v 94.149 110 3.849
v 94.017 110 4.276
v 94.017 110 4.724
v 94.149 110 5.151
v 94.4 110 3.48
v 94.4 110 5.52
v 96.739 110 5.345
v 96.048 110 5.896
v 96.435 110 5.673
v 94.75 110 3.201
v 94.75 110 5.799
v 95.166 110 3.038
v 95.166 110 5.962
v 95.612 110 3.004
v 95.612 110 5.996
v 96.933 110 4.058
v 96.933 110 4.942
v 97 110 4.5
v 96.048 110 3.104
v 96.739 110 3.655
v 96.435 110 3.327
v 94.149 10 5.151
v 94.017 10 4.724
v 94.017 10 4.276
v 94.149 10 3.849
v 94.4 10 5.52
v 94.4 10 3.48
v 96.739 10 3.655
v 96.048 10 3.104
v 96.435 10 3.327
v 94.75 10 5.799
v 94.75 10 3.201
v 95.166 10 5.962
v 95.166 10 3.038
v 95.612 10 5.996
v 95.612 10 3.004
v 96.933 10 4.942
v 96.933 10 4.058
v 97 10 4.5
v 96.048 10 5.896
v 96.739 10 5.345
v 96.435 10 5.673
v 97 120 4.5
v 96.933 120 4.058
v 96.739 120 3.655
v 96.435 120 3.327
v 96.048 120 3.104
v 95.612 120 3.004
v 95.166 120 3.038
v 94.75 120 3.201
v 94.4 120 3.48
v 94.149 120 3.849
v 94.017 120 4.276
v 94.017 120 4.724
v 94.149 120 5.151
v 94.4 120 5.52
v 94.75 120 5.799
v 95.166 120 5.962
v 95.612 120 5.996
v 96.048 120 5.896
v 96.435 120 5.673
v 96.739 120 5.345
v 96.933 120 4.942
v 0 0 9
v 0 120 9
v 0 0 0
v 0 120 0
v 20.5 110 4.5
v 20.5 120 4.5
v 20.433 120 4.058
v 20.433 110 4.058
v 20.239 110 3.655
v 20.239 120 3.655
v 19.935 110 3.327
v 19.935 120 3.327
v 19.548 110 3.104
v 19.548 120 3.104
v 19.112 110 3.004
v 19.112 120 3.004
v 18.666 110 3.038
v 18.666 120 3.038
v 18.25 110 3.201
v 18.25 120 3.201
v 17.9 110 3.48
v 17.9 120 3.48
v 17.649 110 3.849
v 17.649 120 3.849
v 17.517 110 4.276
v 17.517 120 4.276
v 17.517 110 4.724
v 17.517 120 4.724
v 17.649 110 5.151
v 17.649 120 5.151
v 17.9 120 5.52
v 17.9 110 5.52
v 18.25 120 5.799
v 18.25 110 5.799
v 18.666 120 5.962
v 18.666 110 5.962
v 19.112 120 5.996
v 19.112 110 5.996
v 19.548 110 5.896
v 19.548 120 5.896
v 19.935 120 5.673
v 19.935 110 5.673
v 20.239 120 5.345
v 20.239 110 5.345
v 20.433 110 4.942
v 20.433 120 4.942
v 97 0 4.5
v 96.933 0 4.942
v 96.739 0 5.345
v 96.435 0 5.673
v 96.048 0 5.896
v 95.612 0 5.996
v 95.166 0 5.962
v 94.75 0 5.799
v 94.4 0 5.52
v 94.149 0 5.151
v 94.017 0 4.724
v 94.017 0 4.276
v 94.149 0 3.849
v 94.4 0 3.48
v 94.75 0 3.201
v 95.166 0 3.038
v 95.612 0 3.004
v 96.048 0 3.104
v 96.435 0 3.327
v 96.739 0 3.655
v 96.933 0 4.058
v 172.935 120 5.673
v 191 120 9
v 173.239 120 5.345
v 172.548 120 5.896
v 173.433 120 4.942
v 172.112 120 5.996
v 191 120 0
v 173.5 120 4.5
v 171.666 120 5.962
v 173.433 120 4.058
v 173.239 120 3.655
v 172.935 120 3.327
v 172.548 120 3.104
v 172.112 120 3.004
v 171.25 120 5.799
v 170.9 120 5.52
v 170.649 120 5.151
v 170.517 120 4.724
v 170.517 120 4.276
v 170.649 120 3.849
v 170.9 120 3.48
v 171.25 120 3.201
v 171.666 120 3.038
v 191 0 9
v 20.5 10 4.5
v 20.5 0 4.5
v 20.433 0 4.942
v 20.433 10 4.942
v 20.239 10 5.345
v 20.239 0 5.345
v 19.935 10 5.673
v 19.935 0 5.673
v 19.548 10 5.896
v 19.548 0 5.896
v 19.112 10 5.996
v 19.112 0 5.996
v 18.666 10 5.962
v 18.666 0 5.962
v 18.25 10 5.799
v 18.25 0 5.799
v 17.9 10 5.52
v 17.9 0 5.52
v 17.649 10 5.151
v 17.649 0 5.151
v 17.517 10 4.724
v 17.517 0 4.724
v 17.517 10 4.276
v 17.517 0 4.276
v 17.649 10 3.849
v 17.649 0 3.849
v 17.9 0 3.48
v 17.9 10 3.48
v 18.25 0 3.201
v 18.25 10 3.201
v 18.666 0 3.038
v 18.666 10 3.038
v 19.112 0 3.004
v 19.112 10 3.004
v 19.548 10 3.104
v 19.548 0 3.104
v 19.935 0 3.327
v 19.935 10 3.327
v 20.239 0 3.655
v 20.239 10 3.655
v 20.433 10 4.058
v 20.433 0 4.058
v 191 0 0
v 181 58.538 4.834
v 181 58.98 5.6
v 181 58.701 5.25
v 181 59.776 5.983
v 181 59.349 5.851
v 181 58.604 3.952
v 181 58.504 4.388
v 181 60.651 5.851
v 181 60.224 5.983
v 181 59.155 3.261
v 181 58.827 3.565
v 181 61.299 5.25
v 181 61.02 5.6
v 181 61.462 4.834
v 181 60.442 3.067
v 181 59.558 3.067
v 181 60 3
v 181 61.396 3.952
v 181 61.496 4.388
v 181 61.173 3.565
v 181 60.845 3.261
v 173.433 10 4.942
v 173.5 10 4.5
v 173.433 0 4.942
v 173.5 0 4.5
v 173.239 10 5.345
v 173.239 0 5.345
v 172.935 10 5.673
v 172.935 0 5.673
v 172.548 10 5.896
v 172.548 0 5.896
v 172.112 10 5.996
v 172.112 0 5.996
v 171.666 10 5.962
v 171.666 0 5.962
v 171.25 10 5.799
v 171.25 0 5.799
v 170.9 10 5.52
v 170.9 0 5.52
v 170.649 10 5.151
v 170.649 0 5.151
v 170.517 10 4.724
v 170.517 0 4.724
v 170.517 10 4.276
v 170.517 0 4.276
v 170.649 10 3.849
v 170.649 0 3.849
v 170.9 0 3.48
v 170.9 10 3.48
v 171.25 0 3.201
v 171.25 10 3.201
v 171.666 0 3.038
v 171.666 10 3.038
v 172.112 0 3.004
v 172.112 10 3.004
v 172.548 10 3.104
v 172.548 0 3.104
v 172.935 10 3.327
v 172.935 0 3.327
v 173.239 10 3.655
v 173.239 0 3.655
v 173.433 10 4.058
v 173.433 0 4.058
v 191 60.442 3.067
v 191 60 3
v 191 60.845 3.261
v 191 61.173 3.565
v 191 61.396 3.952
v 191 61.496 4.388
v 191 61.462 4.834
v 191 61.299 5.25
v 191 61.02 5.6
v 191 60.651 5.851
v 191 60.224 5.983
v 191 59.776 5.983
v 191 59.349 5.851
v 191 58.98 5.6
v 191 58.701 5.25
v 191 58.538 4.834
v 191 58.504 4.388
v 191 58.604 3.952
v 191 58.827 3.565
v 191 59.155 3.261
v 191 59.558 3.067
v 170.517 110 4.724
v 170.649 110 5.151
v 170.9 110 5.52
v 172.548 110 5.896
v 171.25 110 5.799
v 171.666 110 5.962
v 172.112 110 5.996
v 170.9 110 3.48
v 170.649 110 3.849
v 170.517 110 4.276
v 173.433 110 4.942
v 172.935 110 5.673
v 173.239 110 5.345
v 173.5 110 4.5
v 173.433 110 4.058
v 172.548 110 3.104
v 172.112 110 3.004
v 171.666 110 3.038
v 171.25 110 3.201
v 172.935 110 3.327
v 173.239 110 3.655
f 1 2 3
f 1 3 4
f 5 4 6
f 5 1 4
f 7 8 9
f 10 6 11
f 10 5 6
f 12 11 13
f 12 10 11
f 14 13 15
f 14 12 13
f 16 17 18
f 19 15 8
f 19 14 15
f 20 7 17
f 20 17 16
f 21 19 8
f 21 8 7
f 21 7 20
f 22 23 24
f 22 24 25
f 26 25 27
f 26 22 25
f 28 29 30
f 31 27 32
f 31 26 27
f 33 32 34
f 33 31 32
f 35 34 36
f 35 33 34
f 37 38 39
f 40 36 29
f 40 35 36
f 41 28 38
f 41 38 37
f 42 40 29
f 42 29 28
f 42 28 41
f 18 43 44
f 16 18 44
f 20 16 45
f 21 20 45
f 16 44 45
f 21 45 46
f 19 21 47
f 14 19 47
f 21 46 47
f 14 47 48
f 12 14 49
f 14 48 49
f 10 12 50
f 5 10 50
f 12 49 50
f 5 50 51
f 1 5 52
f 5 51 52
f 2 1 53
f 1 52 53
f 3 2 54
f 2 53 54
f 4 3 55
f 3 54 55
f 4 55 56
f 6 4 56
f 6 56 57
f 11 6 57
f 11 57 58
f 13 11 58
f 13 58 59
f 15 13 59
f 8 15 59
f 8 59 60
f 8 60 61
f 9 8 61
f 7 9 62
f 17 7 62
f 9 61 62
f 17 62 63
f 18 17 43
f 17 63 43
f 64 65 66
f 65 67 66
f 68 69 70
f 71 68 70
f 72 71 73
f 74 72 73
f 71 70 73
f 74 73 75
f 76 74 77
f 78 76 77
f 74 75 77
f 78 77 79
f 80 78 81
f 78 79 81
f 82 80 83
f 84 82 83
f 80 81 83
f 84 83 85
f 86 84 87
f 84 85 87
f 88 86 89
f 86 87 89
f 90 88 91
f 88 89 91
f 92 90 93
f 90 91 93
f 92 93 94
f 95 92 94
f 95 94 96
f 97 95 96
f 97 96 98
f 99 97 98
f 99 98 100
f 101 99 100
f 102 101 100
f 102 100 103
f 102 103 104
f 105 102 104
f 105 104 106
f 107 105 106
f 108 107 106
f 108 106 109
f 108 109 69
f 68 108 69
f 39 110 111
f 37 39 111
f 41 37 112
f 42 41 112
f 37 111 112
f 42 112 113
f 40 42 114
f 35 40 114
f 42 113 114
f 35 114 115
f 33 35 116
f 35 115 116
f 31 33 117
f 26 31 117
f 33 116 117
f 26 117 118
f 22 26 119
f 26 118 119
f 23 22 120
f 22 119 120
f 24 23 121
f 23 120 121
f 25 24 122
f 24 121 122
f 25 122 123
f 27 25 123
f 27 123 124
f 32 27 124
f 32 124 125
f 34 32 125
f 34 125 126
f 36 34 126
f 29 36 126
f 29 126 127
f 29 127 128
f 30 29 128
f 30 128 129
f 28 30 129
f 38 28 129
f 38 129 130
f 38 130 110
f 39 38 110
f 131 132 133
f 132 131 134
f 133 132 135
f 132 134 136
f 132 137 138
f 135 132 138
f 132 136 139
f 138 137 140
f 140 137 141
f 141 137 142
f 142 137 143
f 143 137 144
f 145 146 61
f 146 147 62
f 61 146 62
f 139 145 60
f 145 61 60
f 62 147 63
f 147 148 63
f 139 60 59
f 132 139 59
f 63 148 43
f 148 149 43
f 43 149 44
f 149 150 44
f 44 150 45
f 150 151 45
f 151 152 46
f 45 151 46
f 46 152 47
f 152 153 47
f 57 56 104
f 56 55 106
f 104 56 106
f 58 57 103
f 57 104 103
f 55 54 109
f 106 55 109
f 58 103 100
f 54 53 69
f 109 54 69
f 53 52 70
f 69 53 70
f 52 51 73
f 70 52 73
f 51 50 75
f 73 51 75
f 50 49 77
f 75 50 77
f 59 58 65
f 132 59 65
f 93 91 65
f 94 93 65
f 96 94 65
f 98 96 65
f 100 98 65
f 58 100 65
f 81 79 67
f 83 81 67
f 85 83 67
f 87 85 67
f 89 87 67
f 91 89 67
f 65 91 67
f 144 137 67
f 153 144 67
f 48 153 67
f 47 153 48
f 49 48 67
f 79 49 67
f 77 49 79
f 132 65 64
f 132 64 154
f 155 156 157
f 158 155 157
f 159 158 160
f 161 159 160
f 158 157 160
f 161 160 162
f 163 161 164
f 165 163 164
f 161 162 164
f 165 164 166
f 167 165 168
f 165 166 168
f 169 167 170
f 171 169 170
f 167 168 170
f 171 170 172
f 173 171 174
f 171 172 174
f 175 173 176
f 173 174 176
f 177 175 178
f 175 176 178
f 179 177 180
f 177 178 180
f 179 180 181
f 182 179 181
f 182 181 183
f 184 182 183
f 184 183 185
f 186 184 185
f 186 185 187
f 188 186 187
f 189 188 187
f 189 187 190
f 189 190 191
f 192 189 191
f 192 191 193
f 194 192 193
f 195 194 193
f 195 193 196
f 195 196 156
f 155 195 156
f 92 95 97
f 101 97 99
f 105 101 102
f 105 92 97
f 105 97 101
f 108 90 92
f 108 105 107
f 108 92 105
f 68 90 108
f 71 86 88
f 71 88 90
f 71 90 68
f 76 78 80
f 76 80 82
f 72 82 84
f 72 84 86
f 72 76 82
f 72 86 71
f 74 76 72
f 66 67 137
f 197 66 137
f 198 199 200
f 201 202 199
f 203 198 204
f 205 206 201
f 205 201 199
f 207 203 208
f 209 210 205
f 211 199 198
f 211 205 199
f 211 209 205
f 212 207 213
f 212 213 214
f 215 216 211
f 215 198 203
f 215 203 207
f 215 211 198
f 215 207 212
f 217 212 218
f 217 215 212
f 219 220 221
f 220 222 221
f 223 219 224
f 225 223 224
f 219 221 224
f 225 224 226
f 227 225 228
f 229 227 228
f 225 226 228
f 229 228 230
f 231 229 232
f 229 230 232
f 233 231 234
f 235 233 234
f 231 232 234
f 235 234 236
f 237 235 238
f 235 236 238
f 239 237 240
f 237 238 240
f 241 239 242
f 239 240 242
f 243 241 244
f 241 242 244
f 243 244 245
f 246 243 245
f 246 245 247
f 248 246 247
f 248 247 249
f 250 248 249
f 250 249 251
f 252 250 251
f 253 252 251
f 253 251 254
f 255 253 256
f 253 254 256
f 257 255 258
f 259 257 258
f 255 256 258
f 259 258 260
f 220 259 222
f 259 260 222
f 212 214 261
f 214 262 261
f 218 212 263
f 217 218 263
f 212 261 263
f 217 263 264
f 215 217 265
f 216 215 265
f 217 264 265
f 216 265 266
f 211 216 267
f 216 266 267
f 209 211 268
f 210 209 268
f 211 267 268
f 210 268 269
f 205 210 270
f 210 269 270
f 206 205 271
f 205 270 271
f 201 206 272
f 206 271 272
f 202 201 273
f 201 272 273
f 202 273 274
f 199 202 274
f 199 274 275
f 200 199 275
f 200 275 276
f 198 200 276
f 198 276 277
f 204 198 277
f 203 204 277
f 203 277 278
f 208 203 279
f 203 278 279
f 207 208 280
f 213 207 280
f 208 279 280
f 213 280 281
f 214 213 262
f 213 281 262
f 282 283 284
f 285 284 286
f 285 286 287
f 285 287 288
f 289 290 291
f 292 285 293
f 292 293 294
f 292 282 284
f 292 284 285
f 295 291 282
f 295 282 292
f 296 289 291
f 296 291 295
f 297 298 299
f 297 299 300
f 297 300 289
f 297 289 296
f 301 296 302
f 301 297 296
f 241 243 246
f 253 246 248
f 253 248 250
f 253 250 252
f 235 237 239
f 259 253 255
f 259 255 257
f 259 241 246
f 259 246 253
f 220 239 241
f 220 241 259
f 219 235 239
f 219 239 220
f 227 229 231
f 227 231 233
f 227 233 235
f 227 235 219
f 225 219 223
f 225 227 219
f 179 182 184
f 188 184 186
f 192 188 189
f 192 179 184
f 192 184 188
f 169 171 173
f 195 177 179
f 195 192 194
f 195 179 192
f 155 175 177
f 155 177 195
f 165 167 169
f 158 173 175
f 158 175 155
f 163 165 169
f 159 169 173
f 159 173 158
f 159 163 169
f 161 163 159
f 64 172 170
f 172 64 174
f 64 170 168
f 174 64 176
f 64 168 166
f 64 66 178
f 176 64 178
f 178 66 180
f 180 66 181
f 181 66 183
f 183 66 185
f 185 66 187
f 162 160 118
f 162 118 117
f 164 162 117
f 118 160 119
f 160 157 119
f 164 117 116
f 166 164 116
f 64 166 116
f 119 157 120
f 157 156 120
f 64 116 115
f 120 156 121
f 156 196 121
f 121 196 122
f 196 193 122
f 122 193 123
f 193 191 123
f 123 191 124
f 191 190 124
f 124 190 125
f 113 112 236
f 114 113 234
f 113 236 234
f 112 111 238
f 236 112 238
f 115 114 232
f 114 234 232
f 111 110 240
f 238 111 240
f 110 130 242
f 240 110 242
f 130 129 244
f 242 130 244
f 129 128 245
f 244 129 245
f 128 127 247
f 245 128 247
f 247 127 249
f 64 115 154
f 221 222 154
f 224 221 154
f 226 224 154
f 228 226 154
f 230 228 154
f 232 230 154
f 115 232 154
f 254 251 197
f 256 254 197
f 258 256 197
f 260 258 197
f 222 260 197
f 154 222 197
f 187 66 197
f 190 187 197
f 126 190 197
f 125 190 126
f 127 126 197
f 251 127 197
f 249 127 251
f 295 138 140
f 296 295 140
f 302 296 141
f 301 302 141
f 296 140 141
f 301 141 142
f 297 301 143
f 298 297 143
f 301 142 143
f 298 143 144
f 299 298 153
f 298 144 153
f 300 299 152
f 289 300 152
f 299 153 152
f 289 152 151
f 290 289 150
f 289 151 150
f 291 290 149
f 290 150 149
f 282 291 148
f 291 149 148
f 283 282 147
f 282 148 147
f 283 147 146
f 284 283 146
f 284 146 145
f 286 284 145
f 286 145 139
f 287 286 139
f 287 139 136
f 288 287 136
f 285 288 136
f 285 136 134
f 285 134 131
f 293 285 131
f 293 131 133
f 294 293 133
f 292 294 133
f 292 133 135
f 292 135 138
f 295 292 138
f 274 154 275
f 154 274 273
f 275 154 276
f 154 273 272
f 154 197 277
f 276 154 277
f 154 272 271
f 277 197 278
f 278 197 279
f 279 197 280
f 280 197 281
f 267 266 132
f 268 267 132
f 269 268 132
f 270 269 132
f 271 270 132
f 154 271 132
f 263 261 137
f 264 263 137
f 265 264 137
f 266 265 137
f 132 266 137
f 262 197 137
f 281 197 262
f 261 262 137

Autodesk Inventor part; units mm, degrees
ref_plane "YZ Plane" through (0, 0, 0) normal (1, 0, 0) x (0, 1, 0)
ref_plane "XZ Plane" through (0, 0, 0) normal (0, 1, 0) x (-1, 0, 0)
ref_plane "XY Plane" through (0, 0, 0) normal (0, 0, 1) x (1, 0, 0)
sketch "Sketch1" plane through (0, 0, 0) normal (0, 0, 1) x (1, 0, 0)
  line L0 (0, 0) -> (191, 0)
  line L1 (191, 0) -> (191, 120)
  line L2 (191, 120) -> (0, 120)
  line L3 (0, 120) -> (0, 0)
  dimension "d0" = 191
  dimension "d1" = 120
extrude "Extrusion1" add sketch "Sketch1" along normal blind 9
sketch "Sketch2" plane through (0, 120, 0) normal (0, 1, 0) x (1, 0, 0)
  line L0 (191, 0) -> (0, 0) projected
  line L1 (0, 0) -> (0, -9) projected
  line L2 (191, -9) -> (0, -9) projected
  line L3 (191, 0) -> (191, -9) projected
  circle A0 centre (19, -4.5) radius 1.5
  circle A1 centre (95.5, -4.5) radius 1.5
  circle A2 centre (172, -4.5) radius 1.5
  point P0 (0, 0)
  dimension "d4" = 3
  dimension "d5" = 3
  dimension "d6" = 3
  dimension "d18" = 76.5
extrude "Extrusion2" cut sketch "Sketch2" against normal blind 10 contours A0 | A1 | A2
sketch "Sketch3" plane through (0, 0, 0) normal (0, -1, 0) x (1, 0, 0)
  circle A0 centre (19, 4.5) radius 1.5 projected
  circle A1 centre (172, 4.5) radius 1.5 projected
  circle A2 centre (95.5, 4.5) radius 1.5
  line L0 (191, 0) -> (191, 9) projected
  point P0 (0, 0)
  dimension "d15" = 3
  dimension "d17" = 76.5
extrude "Extrusion3" cut sketch "Sketch3" against normal blind 10
sketch "Sketch4" plane through (191, 0, 0) normal (1, 0, 0) x (0, 0, -1)
  line L0 (0, 0) -> (0, 120) projected
  line L1 (0, 120) -> (-9, 120) projected
  line L2 (-9, 0) -> (-9, 120) projected
  line L3 (0, 0) -> (-9, 0) projected
  circle A0 centre (-4.5, 60) radius 1.5
  point P0 (0, 0)
  dimension "d11" = 3
extrude "Extrusion4" cut sketch "Sketch4" against normal blind 10 contours A0
properties part number "Lateral1-2_3DPrint"
